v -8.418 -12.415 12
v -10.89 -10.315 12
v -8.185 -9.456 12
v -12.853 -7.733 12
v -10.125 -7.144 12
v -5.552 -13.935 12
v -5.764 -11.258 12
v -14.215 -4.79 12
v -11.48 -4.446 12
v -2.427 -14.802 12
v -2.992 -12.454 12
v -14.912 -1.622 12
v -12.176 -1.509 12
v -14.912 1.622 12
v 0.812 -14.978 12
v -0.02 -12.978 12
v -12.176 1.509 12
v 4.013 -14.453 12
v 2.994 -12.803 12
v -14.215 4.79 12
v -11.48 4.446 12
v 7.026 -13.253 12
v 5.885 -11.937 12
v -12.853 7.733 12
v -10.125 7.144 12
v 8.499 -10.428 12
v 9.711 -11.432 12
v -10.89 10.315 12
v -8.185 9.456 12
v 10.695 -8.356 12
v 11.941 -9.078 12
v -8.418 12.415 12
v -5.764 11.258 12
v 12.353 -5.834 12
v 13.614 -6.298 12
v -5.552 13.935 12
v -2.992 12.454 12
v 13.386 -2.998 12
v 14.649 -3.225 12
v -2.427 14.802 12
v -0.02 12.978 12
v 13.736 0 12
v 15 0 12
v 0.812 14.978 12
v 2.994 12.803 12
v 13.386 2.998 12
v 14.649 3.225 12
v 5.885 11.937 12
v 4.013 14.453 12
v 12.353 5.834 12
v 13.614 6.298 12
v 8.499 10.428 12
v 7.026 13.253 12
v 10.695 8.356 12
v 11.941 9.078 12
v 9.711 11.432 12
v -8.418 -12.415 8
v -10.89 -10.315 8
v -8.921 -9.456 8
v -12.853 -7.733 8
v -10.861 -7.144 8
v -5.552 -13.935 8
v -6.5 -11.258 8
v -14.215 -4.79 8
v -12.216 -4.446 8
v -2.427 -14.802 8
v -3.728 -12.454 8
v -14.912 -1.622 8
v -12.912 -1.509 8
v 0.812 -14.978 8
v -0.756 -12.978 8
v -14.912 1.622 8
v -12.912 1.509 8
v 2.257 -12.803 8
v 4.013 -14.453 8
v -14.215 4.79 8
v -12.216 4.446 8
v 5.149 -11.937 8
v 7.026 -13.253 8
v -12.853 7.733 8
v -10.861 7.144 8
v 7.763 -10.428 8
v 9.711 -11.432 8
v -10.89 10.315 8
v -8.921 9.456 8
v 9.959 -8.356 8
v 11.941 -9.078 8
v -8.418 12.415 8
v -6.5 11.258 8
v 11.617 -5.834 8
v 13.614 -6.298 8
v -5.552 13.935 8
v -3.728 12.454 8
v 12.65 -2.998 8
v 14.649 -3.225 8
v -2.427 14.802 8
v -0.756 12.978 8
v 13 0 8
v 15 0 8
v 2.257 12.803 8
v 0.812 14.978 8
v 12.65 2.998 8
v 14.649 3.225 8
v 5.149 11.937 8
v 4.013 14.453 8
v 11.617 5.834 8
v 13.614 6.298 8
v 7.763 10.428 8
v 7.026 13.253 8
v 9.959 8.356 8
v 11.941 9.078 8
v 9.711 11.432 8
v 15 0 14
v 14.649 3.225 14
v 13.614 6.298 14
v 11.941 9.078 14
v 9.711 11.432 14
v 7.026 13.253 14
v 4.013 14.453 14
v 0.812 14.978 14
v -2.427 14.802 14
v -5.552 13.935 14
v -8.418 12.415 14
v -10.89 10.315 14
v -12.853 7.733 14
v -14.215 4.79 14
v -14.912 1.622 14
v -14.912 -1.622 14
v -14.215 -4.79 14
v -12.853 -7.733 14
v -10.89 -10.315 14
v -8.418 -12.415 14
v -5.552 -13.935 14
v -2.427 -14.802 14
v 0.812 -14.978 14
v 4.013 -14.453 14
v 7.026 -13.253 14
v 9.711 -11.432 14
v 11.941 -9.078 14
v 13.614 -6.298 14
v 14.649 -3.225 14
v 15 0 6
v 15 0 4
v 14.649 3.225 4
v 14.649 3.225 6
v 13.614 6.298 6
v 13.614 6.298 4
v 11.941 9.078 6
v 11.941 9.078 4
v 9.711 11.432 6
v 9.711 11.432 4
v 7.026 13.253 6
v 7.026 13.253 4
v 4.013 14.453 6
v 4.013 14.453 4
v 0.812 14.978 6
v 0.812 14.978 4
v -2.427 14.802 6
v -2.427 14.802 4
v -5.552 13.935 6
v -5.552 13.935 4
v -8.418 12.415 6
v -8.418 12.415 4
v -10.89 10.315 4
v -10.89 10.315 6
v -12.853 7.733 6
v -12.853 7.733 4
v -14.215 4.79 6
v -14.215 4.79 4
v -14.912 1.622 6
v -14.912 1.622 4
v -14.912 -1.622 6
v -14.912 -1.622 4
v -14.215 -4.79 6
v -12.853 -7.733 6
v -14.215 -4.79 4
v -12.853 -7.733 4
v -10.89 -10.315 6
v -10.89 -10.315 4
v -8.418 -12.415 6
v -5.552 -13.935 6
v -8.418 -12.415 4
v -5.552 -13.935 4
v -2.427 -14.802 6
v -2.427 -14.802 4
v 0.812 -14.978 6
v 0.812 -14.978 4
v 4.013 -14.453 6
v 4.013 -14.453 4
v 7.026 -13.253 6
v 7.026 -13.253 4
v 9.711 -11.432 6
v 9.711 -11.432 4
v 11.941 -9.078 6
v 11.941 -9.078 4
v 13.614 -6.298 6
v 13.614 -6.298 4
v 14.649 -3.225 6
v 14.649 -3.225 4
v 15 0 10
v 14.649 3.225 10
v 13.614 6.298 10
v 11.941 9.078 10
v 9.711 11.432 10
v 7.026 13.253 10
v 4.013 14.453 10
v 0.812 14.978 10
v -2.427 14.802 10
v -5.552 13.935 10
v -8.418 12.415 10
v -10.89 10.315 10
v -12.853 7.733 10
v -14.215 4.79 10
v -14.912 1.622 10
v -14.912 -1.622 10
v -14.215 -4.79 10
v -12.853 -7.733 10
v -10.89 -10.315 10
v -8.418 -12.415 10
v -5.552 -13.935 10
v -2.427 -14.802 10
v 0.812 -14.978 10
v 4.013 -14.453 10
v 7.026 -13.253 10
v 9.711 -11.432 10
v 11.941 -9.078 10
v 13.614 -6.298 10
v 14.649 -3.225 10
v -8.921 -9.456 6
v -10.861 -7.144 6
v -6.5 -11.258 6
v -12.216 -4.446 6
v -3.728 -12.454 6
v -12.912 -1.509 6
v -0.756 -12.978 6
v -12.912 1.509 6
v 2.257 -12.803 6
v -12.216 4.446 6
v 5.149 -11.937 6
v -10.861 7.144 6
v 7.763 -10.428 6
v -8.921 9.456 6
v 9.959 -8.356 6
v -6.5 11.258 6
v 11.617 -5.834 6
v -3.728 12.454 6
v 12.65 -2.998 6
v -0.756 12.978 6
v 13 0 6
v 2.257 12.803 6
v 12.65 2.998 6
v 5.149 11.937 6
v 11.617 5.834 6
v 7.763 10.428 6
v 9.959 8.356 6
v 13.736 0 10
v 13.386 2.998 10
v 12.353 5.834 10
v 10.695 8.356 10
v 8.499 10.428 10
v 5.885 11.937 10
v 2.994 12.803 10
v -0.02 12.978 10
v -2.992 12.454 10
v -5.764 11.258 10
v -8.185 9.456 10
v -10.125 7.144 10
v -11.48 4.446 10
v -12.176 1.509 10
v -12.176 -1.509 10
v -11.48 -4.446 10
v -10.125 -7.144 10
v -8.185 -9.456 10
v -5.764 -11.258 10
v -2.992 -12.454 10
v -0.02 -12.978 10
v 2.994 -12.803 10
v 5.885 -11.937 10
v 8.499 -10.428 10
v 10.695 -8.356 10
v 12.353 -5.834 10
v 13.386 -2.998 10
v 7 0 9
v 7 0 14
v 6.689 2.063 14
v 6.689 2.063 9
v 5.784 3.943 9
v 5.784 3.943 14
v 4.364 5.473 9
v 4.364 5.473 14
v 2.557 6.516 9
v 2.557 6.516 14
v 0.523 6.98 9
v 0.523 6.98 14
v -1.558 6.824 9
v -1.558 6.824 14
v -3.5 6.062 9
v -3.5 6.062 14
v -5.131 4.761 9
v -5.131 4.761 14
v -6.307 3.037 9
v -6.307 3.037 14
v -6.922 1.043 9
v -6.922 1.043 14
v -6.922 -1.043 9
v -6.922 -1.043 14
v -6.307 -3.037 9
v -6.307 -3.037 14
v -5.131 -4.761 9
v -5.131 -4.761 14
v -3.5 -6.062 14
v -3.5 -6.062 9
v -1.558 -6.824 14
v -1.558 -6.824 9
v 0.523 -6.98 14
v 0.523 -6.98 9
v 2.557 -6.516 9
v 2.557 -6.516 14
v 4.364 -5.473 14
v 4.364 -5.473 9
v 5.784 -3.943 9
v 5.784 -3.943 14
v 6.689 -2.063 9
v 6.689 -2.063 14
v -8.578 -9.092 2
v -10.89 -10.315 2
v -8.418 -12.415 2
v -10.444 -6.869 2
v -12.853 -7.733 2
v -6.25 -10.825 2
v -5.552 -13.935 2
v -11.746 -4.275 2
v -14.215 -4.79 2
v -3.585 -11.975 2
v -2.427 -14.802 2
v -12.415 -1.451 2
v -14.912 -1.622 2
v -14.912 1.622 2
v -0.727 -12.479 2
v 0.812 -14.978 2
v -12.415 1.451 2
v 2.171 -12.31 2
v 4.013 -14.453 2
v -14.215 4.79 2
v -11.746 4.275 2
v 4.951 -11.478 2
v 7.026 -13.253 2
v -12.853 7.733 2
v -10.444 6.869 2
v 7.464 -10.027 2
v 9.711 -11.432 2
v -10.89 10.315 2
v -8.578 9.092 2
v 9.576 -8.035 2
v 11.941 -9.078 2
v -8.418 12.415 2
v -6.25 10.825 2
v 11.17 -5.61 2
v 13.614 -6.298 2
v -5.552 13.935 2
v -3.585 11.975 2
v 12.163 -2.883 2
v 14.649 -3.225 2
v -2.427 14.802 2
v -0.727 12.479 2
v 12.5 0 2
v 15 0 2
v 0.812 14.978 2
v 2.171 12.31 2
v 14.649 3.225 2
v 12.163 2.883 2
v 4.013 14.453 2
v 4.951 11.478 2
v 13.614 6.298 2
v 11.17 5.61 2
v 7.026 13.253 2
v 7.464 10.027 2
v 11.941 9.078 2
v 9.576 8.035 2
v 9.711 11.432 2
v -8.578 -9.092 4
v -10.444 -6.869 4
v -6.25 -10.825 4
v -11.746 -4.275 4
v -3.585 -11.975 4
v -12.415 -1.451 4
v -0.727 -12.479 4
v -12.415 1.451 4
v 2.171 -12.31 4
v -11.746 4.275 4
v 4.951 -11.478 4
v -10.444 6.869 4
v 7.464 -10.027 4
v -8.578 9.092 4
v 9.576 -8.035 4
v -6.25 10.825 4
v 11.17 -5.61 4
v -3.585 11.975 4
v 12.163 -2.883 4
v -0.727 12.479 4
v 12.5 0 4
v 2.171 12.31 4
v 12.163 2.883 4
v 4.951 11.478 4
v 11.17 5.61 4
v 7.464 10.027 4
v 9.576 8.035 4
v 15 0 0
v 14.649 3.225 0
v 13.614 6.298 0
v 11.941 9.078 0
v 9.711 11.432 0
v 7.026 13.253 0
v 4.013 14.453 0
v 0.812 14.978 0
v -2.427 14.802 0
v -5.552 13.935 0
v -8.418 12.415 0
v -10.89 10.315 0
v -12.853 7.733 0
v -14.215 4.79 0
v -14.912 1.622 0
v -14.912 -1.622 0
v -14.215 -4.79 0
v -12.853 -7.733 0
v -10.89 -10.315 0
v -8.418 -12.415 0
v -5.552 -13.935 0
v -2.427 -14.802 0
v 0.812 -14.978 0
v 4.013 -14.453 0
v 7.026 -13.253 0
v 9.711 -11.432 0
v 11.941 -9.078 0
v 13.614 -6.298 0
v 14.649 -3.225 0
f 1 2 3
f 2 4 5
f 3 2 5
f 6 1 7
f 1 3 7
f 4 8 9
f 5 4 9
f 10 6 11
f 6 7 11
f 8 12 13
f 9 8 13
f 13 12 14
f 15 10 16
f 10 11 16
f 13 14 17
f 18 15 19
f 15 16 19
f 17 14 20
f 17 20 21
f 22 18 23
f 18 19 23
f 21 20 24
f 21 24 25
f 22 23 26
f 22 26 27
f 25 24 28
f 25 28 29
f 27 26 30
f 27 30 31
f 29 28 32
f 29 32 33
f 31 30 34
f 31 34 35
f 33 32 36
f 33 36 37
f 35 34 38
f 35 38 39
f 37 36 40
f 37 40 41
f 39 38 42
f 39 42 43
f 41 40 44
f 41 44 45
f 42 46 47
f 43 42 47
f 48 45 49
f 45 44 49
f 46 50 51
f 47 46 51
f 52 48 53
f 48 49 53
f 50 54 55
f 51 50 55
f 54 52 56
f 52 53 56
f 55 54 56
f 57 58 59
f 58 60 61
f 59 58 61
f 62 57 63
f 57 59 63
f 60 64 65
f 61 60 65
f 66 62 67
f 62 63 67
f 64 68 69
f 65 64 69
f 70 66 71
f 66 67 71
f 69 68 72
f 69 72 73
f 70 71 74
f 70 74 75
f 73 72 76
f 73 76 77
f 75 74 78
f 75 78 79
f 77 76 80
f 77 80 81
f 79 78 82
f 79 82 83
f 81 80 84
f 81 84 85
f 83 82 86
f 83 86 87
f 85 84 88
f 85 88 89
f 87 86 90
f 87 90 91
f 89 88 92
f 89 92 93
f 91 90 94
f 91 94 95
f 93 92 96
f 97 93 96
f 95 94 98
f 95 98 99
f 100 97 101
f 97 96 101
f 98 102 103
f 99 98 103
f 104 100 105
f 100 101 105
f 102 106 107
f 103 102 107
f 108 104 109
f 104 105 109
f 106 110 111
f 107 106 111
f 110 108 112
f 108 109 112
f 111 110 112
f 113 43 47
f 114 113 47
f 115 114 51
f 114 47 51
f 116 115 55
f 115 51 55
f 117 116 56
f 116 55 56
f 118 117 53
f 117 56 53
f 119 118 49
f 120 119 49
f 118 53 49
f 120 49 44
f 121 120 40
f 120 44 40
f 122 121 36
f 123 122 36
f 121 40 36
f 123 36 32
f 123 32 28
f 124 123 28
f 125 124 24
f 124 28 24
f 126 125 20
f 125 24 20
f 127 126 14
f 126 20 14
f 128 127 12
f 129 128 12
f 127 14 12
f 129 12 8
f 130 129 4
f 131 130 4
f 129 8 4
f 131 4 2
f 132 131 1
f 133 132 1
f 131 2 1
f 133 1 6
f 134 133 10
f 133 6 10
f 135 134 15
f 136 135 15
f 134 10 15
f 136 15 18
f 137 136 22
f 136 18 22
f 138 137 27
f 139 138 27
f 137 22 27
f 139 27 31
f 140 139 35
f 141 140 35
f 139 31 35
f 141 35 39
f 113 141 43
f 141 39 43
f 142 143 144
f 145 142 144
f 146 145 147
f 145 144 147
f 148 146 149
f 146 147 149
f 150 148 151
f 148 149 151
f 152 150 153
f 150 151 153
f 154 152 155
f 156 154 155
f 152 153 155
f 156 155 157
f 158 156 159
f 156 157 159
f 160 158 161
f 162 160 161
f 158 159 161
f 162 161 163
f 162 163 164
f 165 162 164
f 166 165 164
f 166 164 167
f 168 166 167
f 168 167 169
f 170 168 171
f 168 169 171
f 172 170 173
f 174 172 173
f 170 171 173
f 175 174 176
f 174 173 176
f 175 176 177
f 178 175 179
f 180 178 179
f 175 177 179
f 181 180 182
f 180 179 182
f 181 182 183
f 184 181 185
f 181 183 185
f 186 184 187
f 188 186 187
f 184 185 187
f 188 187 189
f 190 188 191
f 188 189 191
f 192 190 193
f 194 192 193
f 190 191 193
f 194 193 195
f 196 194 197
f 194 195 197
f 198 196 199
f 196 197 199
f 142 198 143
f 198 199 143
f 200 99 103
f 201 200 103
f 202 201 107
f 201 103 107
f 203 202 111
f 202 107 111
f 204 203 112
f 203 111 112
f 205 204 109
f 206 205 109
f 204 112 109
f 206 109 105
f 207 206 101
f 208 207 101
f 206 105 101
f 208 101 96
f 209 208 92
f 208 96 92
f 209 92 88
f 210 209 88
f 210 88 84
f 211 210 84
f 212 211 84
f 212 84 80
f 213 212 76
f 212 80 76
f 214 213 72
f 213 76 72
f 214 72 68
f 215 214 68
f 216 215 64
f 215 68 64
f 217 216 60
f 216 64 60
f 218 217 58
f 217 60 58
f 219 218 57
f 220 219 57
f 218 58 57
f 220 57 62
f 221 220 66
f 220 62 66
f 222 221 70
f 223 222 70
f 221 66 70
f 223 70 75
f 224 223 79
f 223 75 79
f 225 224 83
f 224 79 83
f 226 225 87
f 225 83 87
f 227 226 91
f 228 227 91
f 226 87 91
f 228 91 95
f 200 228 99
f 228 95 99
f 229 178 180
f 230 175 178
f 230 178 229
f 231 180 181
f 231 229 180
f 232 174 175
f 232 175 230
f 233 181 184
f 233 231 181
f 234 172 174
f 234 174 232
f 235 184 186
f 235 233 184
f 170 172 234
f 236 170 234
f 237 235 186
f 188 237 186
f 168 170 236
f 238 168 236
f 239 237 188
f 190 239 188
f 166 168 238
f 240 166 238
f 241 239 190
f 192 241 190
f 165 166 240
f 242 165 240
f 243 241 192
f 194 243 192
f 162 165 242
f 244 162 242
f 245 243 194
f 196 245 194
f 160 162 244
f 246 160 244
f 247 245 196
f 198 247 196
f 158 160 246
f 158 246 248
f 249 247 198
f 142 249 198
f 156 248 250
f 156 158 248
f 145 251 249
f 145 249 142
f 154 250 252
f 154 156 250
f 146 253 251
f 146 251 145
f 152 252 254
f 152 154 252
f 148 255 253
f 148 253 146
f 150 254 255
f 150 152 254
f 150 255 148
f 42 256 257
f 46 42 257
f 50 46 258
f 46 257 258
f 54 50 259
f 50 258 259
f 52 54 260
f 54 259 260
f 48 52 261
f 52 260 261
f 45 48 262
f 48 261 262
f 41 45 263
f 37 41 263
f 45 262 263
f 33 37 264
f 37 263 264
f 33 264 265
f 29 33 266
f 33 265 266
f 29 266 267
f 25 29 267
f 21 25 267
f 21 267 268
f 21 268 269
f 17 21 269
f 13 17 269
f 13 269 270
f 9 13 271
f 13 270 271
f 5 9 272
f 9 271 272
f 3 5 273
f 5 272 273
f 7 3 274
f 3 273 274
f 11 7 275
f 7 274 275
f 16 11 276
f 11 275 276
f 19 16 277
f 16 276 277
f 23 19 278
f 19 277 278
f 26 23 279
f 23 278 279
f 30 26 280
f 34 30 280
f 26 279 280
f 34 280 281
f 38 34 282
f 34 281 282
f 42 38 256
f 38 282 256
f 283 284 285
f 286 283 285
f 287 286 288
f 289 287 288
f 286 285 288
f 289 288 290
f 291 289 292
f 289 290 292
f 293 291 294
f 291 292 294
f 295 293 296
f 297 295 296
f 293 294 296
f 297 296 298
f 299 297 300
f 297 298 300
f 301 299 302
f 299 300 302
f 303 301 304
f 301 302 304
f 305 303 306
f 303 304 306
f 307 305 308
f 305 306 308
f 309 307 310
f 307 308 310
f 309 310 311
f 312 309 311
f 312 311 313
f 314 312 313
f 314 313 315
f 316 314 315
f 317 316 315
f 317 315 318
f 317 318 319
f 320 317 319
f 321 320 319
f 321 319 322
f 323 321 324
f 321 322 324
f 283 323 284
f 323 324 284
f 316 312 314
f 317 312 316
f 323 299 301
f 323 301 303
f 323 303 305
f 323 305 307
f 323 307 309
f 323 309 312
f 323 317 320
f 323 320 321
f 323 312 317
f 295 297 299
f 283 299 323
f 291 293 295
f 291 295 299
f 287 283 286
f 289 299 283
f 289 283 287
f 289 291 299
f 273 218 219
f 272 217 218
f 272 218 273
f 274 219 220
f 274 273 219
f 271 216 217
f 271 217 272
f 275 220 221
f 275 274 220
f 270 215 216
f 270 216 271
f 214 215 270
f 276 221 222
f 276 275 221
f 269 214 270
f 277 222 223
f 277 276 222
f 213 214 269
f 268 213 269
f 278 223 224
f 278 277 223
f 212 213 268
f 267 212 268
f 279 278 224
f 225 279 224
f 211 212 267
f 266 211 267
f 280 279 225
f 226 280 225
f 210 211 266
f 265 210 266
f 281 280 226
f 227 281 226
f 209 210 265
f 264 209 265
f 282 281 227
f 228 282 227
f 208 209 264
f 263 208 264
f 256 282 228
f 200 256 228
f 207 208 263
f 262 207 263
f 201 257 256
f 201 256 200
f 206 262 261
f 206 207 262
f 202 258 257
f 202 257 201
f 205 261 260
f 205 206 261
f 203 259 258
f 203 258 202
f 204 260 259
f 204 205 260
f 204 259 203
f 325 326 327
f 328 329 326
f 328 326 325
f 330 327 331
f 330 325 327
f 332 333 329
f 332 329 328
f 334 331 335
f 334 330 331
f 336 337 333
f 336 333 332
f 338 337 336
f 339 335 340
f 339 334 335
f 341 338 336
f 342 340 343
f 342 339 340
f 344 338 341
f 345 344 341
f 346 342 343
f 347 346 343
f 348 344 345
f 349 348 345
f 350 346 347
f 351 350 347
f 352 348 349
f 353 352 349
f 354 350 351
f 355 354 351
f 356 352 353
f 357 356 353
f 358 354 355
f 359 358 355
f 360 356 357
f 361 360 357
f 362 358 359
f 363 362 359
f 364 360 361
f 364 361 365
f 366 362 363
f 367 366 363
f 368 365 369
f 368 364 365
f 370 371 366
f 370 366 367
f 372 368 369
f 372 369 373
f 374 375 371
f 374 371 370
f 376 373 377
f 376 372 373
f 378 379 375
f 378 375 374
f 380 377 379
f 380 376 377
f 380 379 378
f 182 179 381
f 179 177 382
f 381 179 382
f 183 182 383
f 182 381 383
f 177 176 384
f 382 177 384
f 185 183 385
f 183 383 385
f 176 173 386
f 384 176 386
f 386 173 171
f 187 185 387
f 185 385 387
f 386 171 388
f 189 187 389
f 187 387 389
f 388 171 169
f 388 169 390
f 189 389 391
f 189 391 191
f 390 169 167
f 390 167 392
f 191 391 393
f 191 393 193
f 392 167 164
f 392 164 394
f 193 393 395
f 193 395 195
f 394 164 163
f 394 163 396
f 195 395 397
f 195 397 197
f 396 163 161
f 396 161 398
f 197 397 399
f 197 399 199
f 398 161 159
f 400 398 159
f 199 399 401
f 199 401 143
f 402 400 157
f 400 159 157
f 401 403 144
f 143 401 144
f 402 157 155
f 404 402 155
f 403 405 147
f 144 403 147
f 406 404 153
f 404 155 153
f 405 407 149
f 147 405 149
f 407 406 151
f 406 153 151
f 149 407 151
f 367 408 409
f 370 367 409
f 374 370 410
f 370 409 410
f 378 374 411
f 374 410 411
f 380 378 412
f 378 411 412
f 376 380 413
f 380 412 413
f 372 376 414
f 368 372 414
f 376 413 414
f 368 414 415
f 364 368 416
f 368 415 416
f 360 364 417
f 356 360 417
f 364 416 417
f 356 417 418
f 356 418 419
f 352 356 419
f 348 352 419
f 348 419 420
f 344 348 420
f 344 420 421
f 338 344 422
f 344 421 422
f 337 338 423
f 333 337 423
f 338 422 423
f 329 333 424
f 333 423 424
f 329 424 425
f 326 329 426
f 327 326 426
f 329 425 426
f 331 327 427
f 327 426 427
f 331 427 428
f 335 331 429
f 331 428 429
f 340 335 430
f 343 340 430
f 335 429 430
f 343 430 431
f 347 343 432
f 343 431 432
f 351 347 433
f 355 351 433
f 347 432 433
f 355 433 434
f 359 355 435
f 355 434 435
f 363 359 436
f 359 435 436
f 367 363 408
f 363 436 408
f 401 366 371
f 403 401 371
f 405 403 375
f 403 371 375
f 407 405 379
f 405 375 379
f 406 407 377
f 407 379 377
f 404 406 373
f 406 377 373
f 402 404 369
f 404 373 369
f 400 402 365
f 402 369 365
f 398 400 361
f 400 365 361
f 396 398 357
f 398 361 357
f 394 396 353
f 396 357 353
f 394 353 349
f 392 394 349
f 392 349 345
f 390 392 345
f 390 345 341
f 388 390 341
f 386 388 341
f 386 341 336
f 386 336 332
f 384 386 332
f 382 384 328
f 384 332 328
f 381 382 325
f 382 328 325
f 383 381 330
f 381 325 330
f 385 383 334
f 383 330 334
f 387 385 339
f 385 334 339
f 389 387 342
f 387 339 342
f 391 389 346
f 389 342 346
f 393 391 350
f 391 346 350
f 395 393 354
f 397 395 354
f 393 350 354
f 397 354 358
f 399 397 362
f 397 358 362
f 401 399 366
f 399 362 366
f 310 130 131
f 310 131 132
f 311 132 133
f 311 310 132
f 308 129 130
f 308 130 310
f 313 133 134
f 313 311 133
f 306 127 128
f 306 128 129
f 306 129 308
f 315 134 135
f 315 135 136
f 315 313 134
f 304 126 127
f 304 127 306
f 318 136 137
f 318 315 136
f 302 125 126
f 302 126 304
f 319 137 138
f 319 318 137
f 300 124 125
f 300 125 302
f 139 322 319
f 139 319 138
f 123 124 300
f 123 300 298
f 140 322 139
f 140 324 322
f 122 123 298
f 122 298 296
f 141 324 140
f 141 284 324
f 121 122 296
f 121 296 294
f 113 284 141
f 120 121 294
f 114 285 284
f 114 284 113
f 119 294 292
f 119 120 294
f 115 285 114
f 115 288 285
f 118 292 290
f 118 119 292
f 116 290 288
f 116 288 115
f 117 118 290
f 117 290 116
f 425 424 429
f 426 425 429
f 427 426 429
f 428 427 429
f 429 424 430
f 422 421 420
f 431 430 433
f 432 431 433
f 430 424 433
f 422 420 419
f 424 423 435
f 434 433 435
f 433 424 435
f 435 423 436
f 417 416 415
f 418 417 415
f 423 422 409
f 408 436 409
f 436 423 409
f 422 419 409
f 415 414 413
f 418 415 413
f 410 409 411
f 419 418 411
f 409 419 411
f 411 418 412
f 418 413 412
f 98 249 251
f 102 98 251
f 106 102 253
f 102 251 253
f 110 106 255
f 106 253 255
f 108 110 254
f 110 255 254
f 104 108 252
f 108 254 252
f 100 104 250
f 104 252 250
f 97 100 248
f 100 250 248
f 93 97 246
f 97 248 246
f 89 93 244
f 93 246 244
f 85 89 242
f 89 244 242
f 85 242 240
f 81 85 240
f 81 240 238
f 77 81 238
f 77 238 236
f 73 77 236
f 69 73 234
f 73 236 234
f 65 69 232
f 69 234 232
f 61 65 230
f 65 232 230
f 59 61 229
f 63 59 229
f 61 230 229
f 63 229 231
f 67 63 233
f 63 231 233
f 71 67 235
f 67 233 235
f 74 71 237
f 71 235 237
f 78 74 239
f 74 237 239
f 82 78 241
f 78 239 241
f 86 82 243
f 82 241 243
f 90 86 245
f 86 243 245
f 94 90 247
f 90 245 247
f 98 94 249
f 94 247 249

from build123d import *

# Parameters (mm, degrees)
SKETCH_1_R          = 15
EXTRUDE_1_DEPTH     = 2
SKETCH_3_R          = 12.5
EXTRUDE_2_DEPTH     = 2
SKETCH_4_R          = 15
EXTRUDE_3_DEPTH     = 2
SKETCH_5_R          = 13
EXTRUDE_4_DEPTH     = 2
SKETCH_6_R          = 15
EXTRUDE_5_DEPTH     = 2
SKETCH_7_R          = 13
EXTRUDE_6_DEPTH     = 2
SKETCH_8_R          = 15
EXTRUDE_7_DEPTH     = 2
SKETCH_9_R          = 7
CUT_EXTRUDE_1_DEPTH = 5


with BuildPart() as part:
    # 草图1 → 凸台-拉伸1 (new body)
    with BuildSketch(Plane.XY):
        Circle(SKETCH_1_R)
    extrude(amount=EXTRUDE_1_DEPTH)

    # 草图3 → 凸台-拉伸2 (add)
    with BuildSketch(Plane.XY.offset(2)):
        Circle(SKETCH_3_R)
    extrude(amount=EXTRUDE_2_DEPTH)

    # 草图4 → 凸台-拉伸3 (add)
    with BuildSketch(Plane.XY.offset(4)):
        Circle(SKETCH_4_R)
    extrude(amount=EXTRUDE_3_DEPTH)

    # 草图5 → 凸台-拉伸4 (add)
    with BuildSketch(Plane.XY.offset(6)):
        Circle(SKETCH_5_R)
    extrude(amount=EXTRUDE_4_DEPTH)

    # 草图6 → 凸台-拉伸5 (add)
    with BuildSketch(Plane.XY.offset(8)):
        Circle(SKETCH_6_R)
    extrude(amount=EXTRUDE_5_DEPTH)

    # 草图7 → 凸台-拉伸6 (add)
    with BuildSketch(Plane.XY.offset(10)):
        with Locations((0.736194689, 0)):
            Circle(SKETCH_7_R)
    extrude(amount=EXTRUDE_6_DEPTH)

    # 草图8 → 凸台-拉伸7 (add)
    with BuildSketch(Plane.XY.offset(12)):
        Circle(SKETCH_8_R)
    extrude(amount=EXTRUDE_7_DEPTH)

    # 草图9 → 切除-拉伸1 (cut)
    with BuildSketch(Plane.XY.offset(14)):
        Circle(SKETCH_9_R)
    extrude(amount=-CUT_EXTRUDE_1_DEPTH, mode=Mode.SUBTRACT)


solid = part.part
